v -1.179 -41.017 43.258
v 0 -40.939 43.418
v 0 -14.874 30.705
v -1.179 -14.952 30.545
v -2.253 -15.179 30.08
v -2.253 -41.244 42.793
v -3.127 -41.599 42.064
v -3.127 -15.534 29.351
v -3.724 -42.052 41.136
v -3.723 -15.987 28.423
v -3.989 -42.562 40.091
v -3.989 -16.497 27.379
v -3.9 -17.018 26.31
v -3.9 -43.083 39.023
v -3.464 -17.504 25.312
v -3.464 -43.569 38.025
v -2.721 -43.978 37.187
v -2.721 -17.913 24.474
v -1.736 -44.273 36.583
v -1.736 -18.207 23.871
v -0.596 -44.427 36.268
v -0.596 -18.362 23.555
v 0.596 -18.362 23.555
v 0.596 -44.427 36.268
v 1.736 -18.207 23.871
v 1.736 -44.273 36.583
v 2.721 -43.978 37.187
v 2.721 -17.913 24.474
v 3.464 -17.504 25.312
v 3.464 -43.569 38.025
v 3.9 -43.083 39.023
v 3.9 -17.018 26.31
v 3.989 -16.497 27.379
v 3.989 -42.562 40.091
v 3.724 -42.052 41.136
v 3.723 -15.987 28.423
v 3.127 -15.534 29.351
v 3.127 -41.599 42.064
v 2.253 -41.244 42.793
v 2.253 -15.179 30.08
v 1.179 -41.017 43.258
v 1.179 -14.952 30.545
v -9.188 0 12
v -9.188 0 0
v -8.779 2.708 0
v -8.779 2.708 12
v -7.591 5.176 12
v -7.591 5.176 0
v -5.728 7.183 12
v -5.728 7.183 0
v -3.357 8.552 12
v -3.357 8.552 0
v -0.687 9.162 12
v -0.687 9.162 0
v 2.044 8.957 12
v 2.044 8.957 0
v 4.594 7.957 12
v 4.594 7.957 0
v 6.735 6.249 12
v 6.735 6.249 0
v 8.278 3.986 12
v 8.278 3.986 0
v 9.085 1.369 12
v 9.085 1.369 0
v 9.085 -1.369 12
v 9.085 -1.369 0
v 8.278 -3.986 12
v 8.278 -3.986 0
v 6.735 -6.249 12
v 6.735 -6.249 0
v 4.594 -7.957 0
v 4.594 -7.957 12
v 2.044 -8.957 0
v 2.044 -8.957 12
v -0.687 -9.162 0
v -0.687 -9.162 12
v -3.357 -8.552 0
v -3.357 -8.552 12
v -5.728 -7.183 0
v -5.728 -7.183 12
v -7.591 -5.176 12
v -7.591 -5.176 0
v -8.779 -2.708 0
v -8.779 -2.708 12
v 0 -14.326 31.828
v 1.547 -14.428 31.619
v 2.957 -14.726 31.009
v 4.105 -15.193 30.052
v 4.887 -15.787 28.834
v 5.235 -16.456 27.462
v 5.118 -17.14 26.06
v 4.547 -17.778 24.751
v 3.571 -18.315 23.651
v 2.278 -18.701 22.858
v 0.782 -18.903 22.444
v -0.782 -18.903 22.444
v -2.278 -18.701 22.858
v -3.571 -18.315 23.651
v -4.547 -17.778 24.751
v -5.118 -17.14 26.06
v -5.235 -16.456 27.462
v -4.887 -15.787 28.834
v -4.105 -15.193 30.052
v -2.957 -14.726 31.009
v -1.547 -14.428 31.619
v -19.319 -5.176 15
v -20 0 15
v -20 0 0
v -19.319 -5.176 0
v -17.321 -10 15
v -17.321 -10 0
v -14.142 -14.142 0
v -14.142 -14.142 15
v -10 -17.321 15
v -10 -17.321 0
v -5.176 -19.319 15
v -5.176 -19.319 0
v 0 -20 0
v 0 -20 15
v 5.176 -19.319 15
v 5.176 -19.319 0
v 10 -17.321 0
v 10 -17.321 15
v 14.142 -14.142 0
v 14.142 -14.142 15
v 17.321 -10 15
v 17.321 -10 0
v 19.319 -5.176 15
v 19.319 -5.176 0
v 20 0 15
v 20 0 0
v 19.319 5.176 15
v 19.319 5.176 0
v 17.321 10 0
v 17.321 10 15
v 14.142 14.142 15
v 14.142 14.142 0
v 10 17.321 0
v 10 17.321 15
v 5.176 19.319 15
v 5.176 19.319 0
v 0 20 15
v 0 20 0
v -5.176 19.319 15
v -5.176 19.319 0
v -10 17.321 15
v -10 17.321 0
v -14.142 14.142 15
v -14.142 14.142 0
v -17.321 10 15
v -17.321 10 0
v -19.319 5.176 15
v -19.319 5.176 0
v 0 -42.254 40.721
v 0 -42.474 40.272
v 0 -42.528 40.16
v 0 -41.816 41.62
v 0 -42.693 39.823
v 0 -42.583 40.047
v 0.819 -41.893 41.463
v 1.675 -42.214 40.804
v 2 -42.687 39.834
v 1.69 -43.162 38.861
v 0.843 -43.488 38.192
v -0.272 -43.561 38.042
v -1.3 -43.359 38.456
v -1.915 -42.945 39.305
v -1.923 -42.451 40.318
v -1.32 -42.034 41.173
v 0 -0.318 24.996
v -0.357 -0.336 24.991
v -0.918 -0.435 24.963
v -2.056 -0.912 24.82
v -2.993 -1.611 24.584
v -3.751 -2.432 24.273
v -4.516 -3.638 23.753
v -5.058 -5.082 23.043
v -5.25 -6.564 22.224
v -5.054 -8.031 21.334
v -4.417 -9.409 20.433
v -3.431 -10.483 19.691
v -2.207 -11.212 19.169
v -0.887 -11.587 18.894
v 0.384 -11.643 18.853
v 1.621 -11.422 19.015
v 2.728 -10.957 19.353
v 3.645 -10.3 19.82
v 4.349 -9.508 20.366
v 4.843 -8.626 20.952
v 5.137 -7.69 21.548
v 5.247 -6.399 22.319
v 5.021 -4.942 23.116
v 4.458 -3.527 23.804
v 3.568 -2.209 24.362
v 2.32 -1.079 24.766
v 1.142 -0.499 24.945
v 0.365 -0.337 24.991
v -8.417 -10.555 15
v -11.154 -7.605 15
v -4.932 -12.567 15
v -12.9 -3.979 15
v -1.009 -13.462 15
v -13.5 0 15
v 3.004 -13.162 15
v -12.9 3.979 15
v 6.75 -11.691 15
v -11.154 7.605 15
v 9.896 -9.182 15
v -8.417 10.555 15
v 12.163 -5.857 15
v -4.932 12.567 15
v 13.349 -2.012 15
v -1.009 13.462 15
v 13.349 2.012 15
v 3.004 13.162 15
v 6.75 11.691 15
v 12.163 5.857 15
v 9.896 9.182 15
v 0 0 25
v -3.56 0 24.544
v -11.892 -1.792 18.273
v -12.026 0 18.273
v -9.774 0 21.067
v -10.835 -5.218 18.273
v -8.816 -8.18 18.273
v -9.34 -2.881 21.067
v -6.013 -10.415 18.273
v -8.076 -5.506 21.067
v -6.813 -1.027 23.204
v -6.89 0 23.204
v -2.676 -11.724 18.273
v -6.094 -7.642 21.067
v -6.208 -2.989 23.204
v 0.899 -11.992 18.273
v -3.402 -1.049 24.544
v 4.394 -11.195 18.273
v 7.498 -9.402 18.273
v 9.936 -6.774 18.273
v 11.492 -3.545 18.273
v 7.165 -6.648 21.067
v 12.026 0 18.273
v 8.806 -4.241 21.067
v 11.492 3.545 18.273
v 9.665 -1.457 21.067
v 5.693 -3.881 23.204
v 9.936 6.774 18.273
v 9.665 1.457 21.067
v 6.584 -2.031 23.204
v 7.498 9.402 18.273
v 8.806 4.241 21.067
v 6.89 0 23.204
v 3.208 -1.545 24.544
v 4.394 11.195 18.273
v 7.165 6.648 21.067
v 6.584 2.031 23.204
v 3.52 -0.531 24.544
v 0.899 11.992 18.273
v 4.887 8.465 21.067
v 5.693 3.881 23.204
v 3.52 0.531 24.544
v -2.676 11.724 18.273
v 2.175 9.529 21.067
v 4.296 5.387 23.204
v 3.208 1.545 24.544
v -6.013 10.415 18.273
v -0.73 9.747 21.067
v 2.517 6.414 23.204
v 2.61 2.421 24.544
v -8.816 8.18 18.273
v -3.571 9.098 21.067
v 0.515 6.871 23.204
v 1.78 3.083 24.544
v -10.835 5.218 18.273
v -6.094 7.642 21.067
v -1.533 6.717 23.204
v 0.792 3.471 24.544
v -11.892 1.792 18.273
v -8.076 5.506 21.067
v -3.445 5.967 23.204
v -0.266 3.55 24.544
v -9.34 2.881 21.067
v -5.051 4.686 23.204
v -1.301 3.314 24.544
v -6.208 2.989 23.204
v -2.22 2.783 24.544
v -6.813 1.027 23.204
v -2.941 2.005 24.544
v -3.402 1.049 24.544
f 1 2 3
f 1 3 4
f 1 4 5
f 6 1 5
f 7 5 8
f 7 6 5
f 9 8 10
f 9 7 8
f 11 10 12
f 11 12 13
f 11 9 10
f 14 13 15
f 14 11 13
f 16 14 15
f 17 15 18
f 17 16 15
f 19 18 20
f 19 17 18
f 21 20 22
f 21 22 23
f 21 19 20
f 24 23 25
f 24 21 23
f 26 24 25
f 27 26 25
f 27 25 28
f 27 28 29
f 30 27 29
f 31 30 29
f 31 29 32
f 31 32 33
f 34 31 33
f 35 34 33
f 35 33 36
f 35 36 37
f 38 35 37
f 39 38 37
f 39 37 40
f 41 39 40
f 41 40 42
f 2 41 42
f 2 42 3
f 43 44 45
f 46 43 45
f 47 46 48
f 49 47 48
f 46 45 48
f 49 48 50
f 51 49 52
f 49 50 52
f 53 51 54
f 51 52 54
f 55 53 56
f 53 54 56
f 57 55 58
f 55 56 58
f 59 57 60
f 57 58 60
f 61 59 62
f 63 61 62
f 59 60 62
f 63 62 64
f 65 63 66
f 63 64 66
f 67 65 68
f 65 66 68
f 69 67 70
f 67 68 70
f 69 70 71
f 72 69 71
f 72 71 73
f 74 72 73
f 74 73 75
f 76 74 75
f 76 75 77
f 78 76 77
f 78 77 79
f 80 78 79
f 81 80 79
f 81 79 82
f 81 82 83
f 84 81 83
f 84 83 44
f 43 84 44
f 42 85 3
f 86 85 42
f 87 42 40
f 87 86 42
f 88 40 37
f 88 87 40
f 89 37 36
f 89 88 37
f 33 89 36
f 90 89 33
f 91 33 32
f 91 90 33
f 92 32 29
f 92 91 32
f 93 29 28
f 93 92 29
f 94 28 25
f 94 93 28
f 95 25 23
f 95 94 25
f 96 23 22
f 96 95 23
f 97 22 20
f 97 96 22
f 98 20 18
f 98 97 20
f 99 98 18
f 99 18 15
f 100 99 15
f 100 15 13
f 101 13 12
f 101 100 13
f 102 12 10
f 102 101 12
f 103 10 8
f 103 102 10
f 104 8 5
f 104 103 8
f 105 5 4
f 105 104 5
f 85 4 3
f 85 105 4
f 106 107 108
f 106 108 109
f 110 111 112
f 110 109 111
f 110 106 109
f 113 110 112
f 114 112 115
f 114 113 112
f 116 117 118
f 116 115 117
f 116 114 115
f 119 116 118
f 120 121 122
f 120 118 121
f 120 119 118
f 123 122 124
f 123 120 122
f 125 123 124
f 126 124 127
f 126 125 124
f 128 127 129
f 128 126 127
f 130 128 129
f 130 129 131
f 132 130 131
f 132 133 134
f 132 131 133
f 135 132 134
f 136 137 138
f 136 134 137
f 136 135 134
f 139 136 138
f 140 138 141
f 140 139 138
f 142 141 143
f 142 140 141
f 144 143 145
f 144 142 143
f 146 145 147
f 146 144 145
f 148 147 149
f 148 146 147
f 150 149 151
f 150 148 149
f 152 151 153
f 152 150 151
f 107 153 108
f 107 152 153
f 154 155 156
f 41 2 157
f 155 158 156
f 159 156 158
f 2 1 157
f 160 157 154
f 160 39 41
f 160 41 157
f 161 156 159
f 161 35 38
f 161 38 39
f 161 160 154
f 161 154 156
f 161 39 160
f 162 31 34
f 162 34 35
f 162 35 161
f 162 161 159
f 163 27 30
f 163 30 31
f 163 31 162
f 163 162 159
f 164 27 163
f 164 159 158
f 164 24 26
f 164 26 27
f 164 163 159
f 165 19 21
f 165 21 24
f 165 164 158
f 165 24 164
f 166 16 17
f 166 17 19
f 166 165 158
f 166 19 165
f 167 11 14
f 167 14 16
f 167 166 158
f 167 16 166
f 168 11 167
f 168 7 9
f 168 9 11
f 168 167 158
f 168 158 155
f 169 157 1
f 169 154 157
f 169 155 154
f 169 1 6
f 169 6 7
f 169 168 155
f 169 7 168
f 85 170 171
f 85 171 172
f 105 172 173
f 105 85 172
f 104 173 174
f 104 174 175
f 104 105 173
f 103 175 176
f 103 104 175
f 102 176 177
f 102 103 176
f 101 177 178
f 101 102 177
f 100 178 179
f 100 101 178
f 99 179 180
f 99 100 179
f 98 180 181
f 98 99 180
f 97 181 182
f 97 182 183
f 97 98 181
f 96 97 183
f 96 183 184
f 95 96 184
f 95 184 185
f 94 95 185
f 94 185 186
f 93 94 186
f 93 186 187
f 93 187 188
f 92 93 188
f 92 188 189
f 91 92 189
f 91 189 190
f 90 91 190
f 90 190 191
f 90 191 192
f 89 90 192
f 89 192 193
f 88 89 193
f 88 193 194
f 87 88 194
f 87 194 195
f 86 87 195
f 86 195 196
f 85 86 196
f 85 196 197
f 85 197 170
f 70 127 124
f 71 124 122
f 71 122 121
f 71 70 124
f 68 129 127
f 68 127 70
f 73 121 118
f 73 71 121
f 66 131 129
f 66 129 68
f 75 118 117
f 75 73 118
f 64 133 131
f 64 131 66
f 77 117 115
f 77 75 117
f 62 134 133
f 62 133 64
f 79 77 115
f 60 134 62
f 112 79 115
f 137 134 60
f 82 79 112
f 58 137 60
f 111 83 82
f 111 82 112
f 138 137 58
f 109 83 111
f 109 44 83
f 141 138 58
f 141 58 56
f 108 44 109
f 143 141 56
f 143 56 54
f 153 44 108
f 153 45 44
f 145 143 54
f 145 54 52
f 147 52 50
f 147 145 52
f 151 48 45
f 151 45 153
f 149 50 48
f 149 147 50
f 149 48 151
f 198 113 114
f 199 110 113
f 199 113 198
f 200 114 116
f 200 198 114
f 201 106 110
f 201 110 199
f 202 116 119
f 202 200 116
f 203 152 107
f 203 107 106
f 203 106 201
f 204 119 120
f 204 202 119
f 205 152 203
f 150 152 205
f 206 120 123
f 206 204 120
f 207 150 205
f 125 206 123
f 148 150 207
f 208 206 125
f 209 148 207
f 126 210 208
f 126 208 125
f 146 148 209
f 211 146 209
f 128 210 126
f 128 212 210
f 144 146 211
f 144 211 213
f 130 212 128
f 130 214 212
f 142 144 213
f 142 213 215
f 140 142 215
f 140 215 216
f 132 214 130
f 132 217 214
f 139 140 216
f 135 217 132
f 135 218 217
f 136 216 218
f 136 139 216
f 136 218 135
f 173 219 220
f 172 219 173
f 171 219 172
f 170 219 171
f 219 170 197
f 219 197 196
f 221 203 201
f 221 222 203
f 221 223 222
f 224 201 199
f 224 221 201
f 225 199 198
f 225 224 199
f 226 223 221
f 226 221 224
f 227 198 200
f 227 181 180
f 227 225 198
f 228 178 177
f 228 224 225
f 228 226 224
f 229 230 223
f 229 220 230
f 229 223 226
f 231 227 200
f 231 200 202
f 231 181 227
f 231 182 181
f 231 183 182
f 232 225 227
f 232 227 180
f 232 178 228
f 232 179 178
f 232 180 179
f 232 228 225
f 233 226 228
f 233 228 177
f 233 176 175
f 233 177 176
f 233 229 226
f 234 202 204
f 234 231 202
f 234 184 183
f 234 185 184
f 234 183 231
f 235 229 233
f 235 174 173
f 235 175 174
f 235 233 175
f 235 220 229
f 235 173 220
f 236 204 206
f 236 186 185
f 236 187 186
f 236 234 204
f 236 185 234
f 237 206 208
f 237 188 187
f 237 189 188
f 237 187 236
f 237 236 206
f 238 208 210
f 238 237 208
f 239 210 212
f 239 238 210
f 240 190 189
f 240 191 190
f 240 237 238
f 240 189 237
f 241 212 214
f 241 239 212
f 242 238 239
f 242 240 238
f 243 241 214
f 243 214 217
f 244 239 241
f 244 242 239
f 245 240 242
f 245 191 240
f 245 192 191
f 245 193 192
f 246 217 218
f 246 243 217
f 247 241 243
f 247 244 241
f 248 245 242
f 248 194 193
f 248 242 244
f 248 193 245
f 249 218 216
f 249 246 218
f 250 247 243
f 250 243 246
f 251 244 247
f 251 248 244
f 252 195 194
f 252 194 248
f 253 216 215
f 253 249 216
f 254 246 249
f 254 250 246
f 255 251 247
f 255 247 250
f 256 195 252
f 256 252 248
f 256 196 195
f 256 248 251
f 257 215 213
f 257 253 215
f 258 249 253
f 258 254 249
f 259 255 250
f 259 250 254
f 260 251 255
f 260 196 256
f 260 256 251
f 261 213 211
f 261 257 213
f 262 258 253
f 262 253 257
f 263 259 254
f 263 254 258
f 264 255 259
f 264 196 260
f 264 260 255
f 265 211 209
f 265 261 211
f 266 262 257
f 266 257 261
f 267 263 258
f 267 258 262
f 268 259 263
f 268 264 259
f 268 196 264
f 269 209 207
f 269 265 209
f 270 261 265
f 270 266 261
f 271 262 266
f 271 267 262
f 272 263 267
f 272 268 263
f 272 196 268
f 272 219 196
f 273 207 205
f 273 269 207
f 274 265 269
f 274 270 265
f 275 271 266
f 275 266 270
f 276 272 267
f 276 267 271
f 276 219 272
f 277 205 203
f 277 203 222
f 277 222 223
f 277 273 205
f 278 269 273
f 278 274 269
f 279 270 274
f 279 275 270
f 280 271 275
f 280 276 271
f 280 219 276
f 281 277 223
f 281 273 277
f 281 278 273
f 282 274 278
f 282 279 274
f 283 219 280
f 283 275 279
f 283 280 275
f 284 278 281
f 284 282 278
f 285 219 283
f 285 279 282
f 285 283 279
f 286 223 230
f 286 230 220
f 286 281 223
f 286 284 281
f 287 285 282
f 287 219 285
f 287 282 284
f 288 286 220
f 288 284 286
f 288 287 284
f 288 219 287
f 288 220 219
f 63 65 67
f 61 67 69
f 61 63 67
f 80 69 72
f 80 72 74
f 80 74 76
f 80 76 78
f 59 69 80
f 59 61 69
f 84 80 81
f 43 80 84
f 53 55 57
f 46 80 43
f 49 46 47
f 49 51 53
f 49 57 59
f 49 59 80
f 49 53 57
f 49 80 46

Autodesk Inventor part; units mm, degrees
ref_plane "YZ Plane" through (0, 0, 0) normal (1, 0, 0) x (0, 1, 0)
ref_plane "XZ Plane" through (0, 0, 0) normal (0, 1, 0) x (-1, 0, 0)
ref_plane "XY Plane" through (0, 0, 0) normal (0, 0, 1) x (1, 0, 0)
sketch "Sketch1" plane through (0, 0, 0) normal (0, 1, 0) x (-1, 0, 0)
  line L0 (0, 0) -> (20, 0)
  line L1 (20, 0) -> (20, 15)
  line L2 (20, 15) -> (13.5, 15)
  line L3 (0, 25) -> (0, 0)
  line L4 (0, 0) -> (0, 15.843) construction
  line L5 (0, 25) -> (13.5, 25) construction
  line L6 (13.5, 25) -> (13.5, 15) construction
  line L7 (0, 0) -> (0, -31.0844) construction
  arc A0 (13.5, 15) -> (0, 25) centre (0, 10.8875) ccw
  dimension "d0" = 20
  dimension "d1" = 15
  dimension "d3" = 25
  dimension "d4" = 13.5
revolve "Revolution1" add sketch "Sketch1" angle 360 about axis through (0, 0, 0) along (0, 0, -1)
sketch "Sketch2" plane through (0, 0, 0) normal (1, 0, 0) x (0, 1, 0)
  line L0 (0, 19) -> (-45.3208, 41.1044) construction
  line L1 (0, 19) -> (-38.3392, 19) construction
  line L2 (-20, 0) -> (20, 0) construction
  line L3 (0, 19) -> (0, 0) construction
  line L4 (0, 19) -> (2.3014, 23.7187)
  line L5 (2.3014, 23.7187) -> (-14.3262, 31.8285)
  line L6 (-14.3262, 31.8285) -> (-14.8742, 30.705)
  line L7 (-14.8742, 30.705) -> (-40.9392, 43.4178)
  line L8 (-40.9392, 43.4178) -> (-42.6927, 39.8226)
  line L9 (-42.6927, 39.8226) -> (0, 19)
  dimension "d6" = 19
  dimension "d7" = 26
  dimension "d8" = 18.5
  dimension "d9" = 29
  dimension "d10" = 4
  dimension "d11" = 5.25
revolve "Revolution2" add sketch "Sketch2" angle 360 about axis through (0, 0, 19) along (0, -0.898794, 0.4383711)
sketch "Sketch3" plane through (0, 0, 0) normal (0, 0, -1) x (-1, 0, 0)
  circle A0 centre (0, 0) radius 9.1875
  dimension "d13" = 18.375
extrude "Extrusion1" cut sketch "Sketch3" against normal blind 12
properties part number "waterbottle_lid"
